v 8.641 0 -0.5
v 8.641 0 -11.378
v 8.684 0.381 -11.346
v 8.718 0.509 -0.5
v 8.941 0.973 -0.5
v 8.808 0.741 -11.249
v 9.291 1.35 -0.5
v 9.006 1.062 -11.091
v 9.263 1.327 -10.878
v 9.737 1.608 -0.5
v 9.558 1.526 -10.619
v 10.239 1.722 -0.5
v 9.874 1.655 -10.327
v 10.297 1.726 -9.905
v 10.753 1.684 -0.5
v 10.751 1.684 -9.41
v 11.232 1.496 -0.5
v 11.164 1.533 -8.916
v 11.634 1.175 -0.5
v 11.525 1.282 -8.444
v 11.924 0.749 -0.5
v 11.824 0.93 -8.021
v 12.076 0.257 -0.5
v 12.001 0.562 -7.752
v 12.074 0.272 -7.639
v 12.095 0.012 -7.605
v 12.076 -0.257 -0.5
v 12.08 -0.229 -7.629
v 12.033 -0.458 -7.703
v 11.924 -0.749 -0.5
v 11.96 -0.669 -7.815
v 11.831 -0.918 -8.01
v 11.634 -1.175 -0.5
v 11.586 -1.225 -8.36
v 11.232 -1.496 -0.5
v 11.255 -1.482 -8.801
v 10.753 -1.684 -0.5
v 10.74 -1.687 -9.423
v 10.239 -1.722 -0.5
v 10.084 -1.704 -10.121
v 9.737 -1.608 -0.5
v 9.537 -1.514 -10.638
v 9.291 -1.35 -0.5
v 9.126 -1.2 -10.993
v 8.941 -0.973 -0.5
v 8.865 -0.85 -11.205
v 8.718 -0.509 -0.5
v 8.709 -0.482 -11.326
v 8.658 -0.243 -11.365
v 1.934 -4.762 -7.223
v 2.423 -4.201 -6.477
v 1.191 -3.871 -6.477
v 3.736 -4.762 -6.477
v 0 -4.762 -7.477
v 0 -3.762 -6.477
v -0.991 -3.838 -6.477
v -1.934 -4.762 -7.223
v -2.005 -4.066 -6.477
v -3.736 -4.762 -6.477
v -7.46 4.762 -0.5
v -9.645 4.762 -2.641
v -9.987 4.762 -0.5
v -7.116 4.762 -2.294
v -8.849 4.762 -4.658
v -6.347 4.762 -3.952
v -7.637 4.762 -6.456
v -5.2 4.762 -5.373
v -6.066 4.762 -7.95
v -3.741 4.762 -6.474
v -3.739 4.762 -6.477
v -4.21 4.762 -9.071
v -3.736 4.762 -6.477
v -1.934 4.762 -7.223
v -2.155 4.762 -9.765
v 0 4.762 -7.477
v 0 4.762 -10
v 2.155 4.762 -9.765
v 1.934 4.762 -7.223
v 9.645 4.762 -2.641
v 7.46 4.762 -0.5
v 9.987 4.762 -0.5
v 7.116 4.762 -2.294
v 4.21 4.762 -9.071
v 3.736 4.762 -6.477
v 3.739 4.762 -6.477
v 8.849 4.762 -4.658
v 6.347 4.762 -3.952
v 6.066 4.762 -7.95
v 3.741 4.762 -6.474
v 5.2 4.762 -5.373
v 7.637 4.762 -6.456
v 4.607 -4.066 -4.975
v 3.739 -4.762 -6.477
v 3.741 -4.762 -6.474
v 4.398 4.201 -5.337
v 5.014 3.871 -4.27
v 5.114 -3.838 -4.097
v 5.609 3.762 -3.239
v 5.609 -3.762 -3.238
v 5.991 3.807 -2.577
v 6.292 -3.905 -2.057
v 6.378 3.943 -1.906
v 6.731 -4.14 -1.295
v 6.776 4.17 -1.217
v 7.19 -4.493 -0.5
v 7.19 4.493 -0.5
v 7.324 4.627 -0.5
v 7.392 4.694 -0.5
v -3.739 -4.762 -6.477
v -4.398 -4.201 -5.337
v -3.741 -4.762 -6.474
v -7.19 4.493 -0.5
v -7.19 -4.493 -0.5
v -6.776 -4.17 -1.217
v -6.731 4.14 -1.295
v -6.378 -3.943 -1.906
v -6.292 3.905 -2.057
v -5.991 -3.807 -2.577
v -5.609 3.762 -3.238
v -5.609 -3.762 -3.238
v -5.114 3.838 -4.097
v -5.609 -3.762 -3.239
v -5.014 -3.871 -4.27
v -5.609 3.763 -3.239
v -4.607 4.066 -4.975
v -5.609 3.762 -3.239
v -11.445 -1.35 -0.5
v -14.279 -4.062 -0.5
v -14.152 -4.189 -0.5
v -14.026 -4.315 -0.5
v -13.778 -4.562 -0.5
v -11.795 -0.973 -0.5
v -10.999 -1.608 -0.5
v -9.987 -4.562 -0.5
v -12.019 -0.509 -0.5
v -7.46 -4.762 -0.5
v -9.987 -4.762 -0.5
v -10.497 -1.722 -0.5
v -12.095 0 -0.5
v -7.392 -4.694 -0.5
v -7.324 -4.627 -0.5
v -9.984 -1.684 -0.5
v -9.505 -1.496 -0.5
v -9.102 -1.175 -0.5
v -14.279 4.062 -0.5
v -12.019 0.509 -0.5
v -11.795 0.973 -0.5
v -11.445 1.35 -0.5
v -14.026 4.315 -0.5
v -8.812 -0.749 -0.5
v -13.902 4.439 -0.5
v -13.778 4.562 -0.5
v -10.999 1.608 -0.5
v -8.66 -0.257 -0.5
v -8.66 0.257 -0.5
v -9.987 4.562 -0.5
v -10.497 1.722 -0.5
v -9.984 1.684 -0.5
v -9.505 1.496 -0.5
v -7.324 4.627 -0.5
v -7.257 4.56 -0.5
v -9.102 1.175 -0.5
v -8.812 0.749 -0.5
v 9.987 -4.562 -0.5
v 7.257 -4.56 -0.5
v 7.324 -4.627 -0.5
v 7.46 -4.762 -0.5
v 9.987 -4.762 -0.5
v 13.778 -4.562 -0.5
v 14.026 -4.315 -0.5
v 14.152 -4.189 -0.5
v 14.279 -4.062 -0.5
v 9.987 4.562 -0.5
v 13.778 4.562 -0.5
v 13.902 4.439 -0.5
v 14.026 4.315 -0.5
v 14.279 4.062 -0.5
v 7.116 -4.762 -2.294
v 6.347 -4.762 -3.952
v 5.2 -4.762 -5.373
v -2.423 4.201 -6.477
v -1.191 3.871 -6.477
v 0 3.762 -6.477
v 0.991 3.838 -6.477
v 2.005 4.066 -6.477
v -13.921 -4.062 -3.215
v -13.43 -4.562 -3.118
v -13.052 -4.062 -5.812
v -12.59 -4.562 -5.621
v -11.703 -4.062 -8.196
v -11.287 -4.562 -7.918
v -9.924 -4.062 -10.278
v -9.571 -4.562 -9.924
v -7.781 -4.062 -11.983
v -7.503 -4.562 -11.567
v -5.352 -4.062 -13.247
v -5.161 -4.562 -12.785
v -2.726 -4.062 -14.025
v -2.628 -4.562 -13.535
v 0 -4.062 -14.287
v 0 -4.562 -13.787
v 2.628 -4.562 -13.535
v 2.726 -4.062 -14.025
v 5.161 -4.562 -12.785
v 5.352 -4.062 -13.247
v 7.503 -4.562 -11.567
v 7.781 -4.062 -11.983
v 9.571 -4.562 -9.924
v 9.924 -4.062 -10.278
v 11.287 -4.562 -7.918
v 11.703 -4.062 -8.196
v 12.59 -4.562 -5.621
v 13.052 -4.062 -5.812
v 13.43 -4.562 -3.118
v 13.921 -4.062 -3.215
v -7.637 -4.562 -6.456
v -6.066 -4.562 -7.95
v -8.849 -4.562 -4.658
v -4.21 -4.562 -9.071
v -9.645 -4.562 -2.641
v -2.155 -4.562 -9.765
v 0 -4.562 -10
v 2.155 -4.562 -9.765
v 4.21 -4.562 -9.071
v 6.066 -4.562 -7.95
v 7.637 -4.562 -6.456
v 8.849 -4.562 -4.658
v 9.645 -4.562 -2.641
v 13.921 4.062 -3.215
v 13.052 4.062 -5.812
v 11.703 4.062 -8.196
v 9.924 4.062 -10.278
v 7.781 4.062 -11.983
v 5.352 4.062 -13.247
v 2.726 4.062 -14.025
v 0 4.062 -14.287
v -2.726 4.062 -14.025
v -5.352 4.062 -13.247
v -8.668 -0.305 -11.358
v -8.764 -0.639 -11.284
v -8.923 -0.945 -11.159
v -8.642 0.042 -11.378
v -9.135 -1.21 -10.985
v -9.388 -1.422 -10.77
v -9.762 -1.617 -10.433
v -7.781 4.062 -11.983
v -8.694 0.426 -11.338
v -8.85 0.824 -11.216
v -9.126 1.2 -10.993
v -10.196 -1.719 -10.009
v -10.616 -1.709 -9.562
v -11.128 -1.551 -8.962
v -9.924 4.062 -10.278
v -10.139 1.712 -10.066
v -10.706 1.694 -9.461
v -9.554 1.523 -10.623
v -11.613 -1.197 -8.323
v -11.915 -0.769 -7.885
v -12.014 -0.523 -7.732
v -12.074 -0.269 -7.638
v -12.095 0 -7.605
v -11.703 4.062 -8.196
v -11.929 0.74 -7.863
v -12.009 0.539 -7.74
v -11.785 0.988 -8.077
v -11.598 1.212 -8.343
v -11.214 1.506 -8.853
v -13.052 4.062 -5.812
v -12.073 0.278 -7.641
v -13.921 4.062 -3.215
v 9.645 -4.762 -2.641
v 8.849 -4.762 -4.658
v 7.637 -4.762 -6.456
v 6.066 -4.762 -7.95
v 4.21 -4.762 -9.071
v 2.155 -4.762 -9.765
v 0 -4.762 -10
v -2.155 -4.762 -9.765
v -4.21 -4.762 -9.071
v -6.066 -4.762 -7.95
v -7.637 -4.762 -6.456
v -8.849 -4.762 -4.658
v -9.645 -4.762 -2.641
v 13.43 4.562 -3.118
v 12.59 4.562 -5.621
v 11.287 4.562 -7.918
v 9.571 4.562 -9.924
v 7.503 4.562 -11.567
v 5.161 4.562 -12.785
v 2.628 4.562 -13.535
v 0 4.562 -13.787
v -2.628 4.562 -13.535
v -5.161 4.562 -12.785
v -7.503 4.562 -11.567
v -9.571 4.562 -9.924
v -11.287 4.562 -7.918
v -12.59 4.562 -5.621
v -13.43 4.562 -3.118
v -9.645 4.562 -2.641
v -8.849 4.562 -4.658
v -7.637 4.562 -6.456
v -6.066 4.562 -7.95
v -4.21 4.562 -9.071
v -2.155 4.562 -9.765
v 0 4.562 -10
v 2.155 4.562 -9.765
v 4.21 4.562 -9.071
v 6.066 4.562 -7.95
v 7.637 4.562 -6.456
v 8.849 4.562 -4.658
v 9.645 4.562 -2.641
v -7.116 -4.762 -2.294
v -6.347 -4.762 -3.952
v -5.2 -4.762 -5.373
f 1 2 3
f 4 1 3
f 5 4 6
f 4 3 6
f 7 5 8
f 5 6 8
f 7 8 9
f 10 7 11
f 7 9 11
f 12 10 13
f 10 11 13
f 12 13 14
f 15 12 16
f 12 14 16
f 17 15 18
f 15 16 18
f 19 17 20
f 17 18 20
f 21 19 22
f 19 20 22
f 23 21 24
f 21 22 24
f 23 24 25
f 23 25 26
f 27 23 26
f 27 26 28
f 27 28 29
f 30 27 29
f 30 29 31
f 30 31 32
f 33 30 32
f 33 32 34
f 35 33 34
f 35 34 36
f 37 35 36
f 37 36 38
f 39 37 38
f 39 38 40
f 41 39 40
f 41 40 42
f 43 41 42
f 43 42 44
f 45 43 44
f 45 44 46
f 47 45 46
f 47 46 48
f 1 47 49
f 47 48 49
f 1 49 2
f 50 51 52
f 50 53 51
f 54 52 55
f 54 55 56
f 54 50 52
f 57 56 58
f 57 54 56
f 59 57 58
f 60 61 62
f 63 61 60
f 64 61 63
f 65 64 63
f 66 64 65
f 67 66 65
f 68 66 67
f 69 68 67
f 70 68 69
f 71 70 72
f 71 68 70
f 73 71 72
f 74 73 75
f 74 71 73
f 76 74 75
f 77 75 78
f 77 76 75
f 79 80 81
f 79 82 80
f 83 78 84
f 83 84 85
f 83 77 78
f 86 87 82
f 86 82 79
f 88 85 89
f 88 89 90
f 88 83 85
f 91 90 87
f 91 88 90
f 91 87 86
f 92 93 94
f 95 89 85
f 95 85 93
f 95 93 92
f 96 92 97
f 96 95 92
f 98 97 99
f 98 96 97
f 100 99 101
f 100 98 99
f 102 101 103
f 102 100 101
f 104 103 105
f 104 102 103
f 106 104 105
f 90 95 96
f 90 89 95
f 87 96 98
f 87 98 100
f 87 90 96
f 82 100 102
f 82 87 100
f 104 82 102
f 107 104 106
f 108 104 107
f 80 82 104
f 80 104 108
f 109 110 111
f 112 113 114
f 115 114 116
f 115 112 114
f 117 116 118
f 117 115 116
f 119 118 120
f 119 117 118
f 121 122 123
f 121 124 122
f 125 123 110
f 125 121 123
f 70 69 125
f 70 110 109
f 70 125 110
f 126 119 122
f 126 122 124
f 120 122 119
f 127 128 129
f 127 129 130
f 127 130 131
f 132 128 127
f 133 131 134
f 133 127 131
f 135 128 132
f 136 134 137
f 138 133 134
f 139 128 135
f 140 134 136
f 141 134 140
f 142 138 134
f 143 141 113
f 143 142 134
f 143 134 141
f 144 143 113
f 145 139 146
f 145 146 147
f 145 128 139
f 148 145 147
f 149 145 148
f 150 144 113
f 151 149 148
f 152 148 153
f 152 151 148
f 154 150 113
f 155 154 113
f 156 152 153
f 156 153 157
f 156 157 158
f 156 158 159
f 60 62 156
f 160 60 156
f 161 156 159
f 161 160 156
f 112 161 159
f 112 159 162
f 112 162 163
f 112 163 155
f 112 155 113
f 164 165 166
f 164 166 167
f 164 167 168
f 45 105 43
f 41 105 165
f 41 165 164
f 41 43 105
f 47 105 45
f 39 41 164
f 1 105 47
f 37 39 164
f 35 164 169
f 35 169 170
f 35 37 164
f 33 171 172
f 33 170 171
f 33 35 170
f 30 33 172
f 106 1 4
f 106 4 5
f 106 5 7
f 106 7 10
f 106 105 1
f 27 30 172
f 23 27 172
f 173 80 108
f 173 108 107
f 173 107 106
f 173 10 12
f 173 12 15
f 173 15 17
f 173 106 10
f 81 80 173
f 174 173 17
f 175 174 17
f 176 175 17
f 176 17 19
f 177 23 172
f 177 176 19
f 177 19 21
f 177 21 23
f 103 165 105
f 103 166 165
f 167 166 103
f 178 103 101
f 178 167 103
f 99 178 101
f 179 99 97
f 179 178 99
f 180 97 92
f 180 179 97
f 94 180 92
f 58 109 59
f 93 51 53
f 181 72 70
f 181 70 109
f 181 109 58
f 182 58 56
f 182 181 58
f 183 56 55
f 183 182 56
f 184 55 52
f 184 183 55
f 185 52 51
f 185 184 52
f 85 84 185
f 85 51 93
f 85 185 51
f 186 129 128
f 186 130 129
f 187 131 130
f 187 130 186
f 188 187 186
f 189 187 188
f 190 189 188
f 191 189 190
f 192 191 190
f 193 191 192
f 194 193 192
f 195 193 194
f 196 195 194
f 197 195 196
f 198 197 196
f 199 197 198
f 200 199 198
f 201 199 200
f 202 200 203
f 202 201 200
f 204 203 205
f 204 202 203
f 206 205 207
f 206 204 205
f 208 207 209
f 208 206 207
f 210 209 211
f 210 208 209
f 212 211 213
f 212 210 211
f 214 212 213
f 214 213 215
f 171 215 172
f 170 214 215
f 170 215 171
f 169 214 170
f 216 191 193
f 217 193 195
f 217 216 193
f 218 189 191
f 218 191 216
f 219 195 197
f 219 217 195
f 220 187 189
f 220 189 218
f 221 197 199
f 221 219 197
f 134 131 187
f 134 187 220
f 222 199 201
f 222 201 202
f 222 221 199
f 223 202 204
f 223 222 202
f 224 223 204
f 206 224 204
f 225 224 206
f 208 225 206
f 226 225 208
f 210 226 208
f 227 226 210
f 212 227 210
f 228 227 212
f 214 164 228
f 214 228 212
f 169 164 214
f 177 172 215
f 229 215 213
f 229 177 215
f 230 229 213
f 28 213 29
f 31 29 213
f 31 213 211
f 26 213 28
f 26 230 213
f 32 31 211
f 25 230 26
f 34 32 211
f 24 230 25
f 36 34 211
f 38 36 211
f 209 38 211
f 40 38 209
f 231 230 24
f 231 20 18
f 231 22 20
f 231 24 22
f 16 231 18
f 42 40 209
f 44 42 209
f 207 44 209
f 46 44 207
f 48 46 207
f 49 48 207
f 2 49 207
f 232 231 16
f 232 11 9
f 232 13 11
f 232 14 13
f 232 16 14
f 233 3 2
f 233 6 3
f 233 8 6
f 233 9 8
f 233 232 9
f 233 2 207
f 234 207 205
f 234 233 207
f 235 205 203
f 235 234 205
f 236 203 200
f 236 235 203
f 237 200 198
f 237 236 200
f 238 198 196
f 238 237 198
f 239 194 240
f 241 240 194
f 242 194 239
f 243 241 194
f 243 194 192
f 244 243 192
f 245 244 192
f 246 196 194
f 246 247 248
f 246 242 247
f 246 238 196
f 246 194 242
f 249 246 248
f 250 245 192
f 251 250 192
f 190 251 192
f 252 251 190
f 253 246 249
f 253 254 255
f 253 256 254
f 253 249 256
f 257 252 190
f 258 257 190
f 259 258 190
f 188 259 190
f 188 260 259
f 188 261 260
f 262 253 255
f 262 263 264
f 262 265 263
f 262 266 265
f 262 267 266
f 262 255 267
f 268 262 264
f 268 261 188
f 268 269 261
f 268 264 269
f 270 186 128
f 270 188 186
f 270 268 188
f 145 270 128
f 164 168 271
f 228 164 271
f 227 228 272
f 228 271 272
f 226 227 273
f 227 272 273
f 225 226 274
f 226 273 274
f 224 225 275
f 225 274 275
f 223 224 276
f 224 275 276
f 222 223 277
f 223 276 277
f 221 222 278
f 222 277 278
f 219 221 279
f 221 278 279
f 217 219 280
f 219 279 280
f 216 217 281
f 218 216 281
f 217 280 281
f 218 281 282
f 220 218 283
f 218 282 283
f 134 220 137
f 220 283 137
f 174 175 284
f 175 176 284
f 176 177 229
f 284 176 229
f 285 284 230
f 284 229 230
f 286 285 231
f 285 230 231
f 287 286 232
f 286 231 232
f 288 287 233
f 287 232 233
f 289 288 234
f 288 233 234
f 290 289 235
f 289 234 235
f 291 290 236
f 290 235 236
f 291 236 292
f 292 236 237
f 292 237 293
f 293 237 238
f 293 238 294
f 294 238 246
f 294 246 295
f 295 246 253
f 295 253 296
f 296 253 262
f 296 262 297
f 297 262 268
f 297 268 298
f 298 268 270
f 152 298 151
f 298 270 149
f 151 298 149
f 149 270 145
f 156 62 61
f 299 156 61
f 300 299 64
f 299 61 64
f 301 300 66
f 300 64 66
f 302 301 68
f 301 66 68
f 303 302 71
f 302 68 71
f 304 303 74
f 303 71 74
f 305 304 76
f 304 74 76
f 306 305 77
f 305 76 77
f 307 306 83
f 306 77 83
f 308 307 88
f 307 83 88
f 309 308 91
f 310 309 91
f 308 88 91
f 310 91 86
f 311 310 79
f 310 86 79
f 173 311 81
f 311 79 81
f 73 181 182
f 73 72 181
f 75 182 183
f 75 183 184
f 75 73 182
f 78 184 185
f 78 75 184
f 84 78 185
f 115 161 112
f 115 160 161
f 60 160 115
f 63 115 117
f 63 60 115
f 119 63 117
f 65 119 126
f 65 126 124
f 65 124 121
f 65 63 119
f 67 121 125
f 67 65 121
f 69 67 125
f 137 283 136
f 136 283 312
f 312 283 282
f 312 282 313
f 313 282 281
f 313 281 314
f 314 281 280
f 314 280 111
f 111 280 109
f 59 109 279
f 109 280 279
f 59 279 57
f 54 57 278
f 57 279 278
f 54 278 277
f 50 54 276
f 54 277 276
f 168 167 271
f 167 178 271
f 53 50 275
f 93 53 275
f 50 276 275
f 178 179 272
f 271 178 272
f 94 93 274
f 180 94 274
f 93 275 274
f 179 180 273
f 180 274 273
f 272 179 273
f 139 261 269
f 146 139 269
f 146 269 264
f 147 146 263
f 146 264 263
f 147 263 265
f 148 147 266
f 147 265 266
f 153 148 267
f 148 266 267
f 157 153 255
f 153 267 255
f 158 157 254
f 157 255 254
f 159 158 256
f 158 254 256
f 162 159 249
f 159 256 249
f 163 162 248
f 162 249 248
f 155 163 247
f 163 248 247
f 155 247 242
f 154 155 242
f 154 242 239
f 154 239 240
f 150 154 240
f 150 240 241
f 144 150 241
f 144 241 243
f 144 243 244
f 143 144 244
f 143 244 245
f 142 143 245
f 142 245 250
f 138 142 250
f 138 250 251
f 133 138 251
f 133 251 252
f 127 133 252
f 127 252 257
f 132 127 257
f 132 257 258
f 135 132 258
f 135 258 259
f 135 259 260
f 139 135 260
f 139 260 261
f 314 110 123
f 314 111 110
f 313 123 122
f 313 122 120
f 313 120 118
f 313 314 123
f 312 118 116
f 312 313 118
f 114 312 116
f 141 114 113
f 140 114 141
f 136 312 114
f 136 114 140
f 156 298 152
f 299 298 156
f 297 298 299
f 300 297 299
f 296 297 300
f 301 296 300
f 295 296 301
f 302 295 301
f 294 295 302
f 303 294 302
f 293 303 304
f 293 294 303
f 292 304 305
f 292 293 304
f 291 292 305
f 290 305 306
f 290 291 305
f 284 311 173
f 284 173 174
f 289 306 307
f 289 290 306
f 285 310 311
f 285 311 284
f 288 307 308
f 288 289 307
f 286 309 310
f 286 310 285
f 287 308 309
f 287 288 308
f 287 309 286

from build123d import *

# Parameters (mm, degrees)
BOSS_EXTRUDE1_DEPTH             = 9.525
CUT_EXTRUDE7_DEPTH              = 0.2
CUT_EXTRUDE8_DEPTH              = 0.2
F_29_0_136_DIAMETER_HOLE4_D     = 3.4544
F_29_0_136_DIAMETER_HOLE4_DEPTH = 13.7875
CHAMFER4_SIZE                   = 0.5


with BuildPart() as part:
    # Sketch19 → Boss-Extrude1 (new body)
    with BuildSketch(Plane(origin=(0, 4.7625, 0), x_dir=(1, 0, 0), z_dir=(0, 1, 0))):
        with BuildLine():
            Line((-14.278748413, 0.5), (-7.190320252, 0.5))
            Line((-7.190320252, 0.5), (-3.739497694, 6.477))
            Line((-3.739497694, 6.477), (3.739497694, 6.477))
            Line((3.739497694, 6.477), (7.190320252, 0.5))
            Line((7.190320252, 0.5), (14.278748413, 0.5))
            ThreePointArc((14.278748413, 0.5), (0, 14.2875), (-14.278748413, 0.5))
        make_face()
    extrude(amount=-BOSS_EXTRUDE1_DEPTH)

    # Sketch20 → Cut-Revolve1 (revolve, cut)
    with BuildSketch(Plane(origin=(0, 0, 0), x_dir=(0, -1, 0), z_dir=(-0.865794102, 0, -0.500400412))):
        Polygon((4.7625, 0), (3.7625, 0), (3.7625, -6.477), (4.7625, -7.477), align=None)
    revolve(axis=Axis((0, -4.7625, 0), (0, 1, 0)), mode=Mode.SUBTRACT)

    # Sketch21 → Cut-Revolve2 (revolve, cut)
    with BuildSketch(Plane(origin=(0, 0, 0), x_dir=(0, 1, 0), z_dir=(0.06687174, 0, 0.99776158))):
        Polygon((4.7625, -7.477), (4.7625, 0), (3.7625, 0), (3.7625, -6.477), align=None)
    revolve(axis=Axis((0, 4.7625, 0), (0, -1, 0)), mode=Mode.SUBTRACT)

    # Sketch26 → Cut-Extrude7 (cut)
    with BuildSketch(Plane(origin=(0, 4.7625, 0), x_dir=(1, 0, 0), z_dir=(0, 1, 0))):
        with BuildLine():
            Line((-14.278748413, 0.5), (-9.987492178, 0.5))
            ThreePointArc((-9.987492178, 0.5), (0, 10), (9.987492178, 0.5))
            Line((9.987492178, 0.5), (14.278748413, 0.5))
            ThreePointArc((14.278748413, 0.5), (0, 14.2875), (-14.278748413, 0.5))
        make_face()
    extrude(amount=-CUT_EXTRUDE7_DEPTH, mode=Mode.SUBTRACT)

    # Sketch27 → Cut-Extrude8 (cut)
    with BuildSketch(Plane.XZ.offset(4.7625)):
        with BuildLine():
            Line((-9.987492178, -0.5), (-14.278748413, -0.5))
            ThreePointArc((-14.278748413, -0.5), (0, -14.2875), (14.278748413, -0.5))
            Line((14.278748413, -0.5), (9.987492178, -0.5))
            ThreePointArc((9.987492178, -0.5), (0, -10), (-9.987492178, -0.5))
        make_face()
    extrude(amount=-CUT_EXTRUDE8_DEPTH, mode=Mode.SUBTRACT)

    # #29 (0.136) Diameter Hole4
    with Locations(Plane.XY.offset(-0.5)):
        with Locations((-10.368210259, 0), (10.368210259, 0)):
            Hole(F_29_0_136_DIAMETER_HOLE4_D / 2, depth=F_29_0_136_DIAMETER_HOLE4_DEPTH)

    # Chamfer4
    chamfer4_edges = [part.edges().sort_by_distance(p)[0] for p in [
        (0, 4.5625, -14.2875),
        (0, -4.5625, -14.2875),
    ]]
    chamfer(chamfer4_edges, length=CHAMFER4_SIZE)


solid = part.part
